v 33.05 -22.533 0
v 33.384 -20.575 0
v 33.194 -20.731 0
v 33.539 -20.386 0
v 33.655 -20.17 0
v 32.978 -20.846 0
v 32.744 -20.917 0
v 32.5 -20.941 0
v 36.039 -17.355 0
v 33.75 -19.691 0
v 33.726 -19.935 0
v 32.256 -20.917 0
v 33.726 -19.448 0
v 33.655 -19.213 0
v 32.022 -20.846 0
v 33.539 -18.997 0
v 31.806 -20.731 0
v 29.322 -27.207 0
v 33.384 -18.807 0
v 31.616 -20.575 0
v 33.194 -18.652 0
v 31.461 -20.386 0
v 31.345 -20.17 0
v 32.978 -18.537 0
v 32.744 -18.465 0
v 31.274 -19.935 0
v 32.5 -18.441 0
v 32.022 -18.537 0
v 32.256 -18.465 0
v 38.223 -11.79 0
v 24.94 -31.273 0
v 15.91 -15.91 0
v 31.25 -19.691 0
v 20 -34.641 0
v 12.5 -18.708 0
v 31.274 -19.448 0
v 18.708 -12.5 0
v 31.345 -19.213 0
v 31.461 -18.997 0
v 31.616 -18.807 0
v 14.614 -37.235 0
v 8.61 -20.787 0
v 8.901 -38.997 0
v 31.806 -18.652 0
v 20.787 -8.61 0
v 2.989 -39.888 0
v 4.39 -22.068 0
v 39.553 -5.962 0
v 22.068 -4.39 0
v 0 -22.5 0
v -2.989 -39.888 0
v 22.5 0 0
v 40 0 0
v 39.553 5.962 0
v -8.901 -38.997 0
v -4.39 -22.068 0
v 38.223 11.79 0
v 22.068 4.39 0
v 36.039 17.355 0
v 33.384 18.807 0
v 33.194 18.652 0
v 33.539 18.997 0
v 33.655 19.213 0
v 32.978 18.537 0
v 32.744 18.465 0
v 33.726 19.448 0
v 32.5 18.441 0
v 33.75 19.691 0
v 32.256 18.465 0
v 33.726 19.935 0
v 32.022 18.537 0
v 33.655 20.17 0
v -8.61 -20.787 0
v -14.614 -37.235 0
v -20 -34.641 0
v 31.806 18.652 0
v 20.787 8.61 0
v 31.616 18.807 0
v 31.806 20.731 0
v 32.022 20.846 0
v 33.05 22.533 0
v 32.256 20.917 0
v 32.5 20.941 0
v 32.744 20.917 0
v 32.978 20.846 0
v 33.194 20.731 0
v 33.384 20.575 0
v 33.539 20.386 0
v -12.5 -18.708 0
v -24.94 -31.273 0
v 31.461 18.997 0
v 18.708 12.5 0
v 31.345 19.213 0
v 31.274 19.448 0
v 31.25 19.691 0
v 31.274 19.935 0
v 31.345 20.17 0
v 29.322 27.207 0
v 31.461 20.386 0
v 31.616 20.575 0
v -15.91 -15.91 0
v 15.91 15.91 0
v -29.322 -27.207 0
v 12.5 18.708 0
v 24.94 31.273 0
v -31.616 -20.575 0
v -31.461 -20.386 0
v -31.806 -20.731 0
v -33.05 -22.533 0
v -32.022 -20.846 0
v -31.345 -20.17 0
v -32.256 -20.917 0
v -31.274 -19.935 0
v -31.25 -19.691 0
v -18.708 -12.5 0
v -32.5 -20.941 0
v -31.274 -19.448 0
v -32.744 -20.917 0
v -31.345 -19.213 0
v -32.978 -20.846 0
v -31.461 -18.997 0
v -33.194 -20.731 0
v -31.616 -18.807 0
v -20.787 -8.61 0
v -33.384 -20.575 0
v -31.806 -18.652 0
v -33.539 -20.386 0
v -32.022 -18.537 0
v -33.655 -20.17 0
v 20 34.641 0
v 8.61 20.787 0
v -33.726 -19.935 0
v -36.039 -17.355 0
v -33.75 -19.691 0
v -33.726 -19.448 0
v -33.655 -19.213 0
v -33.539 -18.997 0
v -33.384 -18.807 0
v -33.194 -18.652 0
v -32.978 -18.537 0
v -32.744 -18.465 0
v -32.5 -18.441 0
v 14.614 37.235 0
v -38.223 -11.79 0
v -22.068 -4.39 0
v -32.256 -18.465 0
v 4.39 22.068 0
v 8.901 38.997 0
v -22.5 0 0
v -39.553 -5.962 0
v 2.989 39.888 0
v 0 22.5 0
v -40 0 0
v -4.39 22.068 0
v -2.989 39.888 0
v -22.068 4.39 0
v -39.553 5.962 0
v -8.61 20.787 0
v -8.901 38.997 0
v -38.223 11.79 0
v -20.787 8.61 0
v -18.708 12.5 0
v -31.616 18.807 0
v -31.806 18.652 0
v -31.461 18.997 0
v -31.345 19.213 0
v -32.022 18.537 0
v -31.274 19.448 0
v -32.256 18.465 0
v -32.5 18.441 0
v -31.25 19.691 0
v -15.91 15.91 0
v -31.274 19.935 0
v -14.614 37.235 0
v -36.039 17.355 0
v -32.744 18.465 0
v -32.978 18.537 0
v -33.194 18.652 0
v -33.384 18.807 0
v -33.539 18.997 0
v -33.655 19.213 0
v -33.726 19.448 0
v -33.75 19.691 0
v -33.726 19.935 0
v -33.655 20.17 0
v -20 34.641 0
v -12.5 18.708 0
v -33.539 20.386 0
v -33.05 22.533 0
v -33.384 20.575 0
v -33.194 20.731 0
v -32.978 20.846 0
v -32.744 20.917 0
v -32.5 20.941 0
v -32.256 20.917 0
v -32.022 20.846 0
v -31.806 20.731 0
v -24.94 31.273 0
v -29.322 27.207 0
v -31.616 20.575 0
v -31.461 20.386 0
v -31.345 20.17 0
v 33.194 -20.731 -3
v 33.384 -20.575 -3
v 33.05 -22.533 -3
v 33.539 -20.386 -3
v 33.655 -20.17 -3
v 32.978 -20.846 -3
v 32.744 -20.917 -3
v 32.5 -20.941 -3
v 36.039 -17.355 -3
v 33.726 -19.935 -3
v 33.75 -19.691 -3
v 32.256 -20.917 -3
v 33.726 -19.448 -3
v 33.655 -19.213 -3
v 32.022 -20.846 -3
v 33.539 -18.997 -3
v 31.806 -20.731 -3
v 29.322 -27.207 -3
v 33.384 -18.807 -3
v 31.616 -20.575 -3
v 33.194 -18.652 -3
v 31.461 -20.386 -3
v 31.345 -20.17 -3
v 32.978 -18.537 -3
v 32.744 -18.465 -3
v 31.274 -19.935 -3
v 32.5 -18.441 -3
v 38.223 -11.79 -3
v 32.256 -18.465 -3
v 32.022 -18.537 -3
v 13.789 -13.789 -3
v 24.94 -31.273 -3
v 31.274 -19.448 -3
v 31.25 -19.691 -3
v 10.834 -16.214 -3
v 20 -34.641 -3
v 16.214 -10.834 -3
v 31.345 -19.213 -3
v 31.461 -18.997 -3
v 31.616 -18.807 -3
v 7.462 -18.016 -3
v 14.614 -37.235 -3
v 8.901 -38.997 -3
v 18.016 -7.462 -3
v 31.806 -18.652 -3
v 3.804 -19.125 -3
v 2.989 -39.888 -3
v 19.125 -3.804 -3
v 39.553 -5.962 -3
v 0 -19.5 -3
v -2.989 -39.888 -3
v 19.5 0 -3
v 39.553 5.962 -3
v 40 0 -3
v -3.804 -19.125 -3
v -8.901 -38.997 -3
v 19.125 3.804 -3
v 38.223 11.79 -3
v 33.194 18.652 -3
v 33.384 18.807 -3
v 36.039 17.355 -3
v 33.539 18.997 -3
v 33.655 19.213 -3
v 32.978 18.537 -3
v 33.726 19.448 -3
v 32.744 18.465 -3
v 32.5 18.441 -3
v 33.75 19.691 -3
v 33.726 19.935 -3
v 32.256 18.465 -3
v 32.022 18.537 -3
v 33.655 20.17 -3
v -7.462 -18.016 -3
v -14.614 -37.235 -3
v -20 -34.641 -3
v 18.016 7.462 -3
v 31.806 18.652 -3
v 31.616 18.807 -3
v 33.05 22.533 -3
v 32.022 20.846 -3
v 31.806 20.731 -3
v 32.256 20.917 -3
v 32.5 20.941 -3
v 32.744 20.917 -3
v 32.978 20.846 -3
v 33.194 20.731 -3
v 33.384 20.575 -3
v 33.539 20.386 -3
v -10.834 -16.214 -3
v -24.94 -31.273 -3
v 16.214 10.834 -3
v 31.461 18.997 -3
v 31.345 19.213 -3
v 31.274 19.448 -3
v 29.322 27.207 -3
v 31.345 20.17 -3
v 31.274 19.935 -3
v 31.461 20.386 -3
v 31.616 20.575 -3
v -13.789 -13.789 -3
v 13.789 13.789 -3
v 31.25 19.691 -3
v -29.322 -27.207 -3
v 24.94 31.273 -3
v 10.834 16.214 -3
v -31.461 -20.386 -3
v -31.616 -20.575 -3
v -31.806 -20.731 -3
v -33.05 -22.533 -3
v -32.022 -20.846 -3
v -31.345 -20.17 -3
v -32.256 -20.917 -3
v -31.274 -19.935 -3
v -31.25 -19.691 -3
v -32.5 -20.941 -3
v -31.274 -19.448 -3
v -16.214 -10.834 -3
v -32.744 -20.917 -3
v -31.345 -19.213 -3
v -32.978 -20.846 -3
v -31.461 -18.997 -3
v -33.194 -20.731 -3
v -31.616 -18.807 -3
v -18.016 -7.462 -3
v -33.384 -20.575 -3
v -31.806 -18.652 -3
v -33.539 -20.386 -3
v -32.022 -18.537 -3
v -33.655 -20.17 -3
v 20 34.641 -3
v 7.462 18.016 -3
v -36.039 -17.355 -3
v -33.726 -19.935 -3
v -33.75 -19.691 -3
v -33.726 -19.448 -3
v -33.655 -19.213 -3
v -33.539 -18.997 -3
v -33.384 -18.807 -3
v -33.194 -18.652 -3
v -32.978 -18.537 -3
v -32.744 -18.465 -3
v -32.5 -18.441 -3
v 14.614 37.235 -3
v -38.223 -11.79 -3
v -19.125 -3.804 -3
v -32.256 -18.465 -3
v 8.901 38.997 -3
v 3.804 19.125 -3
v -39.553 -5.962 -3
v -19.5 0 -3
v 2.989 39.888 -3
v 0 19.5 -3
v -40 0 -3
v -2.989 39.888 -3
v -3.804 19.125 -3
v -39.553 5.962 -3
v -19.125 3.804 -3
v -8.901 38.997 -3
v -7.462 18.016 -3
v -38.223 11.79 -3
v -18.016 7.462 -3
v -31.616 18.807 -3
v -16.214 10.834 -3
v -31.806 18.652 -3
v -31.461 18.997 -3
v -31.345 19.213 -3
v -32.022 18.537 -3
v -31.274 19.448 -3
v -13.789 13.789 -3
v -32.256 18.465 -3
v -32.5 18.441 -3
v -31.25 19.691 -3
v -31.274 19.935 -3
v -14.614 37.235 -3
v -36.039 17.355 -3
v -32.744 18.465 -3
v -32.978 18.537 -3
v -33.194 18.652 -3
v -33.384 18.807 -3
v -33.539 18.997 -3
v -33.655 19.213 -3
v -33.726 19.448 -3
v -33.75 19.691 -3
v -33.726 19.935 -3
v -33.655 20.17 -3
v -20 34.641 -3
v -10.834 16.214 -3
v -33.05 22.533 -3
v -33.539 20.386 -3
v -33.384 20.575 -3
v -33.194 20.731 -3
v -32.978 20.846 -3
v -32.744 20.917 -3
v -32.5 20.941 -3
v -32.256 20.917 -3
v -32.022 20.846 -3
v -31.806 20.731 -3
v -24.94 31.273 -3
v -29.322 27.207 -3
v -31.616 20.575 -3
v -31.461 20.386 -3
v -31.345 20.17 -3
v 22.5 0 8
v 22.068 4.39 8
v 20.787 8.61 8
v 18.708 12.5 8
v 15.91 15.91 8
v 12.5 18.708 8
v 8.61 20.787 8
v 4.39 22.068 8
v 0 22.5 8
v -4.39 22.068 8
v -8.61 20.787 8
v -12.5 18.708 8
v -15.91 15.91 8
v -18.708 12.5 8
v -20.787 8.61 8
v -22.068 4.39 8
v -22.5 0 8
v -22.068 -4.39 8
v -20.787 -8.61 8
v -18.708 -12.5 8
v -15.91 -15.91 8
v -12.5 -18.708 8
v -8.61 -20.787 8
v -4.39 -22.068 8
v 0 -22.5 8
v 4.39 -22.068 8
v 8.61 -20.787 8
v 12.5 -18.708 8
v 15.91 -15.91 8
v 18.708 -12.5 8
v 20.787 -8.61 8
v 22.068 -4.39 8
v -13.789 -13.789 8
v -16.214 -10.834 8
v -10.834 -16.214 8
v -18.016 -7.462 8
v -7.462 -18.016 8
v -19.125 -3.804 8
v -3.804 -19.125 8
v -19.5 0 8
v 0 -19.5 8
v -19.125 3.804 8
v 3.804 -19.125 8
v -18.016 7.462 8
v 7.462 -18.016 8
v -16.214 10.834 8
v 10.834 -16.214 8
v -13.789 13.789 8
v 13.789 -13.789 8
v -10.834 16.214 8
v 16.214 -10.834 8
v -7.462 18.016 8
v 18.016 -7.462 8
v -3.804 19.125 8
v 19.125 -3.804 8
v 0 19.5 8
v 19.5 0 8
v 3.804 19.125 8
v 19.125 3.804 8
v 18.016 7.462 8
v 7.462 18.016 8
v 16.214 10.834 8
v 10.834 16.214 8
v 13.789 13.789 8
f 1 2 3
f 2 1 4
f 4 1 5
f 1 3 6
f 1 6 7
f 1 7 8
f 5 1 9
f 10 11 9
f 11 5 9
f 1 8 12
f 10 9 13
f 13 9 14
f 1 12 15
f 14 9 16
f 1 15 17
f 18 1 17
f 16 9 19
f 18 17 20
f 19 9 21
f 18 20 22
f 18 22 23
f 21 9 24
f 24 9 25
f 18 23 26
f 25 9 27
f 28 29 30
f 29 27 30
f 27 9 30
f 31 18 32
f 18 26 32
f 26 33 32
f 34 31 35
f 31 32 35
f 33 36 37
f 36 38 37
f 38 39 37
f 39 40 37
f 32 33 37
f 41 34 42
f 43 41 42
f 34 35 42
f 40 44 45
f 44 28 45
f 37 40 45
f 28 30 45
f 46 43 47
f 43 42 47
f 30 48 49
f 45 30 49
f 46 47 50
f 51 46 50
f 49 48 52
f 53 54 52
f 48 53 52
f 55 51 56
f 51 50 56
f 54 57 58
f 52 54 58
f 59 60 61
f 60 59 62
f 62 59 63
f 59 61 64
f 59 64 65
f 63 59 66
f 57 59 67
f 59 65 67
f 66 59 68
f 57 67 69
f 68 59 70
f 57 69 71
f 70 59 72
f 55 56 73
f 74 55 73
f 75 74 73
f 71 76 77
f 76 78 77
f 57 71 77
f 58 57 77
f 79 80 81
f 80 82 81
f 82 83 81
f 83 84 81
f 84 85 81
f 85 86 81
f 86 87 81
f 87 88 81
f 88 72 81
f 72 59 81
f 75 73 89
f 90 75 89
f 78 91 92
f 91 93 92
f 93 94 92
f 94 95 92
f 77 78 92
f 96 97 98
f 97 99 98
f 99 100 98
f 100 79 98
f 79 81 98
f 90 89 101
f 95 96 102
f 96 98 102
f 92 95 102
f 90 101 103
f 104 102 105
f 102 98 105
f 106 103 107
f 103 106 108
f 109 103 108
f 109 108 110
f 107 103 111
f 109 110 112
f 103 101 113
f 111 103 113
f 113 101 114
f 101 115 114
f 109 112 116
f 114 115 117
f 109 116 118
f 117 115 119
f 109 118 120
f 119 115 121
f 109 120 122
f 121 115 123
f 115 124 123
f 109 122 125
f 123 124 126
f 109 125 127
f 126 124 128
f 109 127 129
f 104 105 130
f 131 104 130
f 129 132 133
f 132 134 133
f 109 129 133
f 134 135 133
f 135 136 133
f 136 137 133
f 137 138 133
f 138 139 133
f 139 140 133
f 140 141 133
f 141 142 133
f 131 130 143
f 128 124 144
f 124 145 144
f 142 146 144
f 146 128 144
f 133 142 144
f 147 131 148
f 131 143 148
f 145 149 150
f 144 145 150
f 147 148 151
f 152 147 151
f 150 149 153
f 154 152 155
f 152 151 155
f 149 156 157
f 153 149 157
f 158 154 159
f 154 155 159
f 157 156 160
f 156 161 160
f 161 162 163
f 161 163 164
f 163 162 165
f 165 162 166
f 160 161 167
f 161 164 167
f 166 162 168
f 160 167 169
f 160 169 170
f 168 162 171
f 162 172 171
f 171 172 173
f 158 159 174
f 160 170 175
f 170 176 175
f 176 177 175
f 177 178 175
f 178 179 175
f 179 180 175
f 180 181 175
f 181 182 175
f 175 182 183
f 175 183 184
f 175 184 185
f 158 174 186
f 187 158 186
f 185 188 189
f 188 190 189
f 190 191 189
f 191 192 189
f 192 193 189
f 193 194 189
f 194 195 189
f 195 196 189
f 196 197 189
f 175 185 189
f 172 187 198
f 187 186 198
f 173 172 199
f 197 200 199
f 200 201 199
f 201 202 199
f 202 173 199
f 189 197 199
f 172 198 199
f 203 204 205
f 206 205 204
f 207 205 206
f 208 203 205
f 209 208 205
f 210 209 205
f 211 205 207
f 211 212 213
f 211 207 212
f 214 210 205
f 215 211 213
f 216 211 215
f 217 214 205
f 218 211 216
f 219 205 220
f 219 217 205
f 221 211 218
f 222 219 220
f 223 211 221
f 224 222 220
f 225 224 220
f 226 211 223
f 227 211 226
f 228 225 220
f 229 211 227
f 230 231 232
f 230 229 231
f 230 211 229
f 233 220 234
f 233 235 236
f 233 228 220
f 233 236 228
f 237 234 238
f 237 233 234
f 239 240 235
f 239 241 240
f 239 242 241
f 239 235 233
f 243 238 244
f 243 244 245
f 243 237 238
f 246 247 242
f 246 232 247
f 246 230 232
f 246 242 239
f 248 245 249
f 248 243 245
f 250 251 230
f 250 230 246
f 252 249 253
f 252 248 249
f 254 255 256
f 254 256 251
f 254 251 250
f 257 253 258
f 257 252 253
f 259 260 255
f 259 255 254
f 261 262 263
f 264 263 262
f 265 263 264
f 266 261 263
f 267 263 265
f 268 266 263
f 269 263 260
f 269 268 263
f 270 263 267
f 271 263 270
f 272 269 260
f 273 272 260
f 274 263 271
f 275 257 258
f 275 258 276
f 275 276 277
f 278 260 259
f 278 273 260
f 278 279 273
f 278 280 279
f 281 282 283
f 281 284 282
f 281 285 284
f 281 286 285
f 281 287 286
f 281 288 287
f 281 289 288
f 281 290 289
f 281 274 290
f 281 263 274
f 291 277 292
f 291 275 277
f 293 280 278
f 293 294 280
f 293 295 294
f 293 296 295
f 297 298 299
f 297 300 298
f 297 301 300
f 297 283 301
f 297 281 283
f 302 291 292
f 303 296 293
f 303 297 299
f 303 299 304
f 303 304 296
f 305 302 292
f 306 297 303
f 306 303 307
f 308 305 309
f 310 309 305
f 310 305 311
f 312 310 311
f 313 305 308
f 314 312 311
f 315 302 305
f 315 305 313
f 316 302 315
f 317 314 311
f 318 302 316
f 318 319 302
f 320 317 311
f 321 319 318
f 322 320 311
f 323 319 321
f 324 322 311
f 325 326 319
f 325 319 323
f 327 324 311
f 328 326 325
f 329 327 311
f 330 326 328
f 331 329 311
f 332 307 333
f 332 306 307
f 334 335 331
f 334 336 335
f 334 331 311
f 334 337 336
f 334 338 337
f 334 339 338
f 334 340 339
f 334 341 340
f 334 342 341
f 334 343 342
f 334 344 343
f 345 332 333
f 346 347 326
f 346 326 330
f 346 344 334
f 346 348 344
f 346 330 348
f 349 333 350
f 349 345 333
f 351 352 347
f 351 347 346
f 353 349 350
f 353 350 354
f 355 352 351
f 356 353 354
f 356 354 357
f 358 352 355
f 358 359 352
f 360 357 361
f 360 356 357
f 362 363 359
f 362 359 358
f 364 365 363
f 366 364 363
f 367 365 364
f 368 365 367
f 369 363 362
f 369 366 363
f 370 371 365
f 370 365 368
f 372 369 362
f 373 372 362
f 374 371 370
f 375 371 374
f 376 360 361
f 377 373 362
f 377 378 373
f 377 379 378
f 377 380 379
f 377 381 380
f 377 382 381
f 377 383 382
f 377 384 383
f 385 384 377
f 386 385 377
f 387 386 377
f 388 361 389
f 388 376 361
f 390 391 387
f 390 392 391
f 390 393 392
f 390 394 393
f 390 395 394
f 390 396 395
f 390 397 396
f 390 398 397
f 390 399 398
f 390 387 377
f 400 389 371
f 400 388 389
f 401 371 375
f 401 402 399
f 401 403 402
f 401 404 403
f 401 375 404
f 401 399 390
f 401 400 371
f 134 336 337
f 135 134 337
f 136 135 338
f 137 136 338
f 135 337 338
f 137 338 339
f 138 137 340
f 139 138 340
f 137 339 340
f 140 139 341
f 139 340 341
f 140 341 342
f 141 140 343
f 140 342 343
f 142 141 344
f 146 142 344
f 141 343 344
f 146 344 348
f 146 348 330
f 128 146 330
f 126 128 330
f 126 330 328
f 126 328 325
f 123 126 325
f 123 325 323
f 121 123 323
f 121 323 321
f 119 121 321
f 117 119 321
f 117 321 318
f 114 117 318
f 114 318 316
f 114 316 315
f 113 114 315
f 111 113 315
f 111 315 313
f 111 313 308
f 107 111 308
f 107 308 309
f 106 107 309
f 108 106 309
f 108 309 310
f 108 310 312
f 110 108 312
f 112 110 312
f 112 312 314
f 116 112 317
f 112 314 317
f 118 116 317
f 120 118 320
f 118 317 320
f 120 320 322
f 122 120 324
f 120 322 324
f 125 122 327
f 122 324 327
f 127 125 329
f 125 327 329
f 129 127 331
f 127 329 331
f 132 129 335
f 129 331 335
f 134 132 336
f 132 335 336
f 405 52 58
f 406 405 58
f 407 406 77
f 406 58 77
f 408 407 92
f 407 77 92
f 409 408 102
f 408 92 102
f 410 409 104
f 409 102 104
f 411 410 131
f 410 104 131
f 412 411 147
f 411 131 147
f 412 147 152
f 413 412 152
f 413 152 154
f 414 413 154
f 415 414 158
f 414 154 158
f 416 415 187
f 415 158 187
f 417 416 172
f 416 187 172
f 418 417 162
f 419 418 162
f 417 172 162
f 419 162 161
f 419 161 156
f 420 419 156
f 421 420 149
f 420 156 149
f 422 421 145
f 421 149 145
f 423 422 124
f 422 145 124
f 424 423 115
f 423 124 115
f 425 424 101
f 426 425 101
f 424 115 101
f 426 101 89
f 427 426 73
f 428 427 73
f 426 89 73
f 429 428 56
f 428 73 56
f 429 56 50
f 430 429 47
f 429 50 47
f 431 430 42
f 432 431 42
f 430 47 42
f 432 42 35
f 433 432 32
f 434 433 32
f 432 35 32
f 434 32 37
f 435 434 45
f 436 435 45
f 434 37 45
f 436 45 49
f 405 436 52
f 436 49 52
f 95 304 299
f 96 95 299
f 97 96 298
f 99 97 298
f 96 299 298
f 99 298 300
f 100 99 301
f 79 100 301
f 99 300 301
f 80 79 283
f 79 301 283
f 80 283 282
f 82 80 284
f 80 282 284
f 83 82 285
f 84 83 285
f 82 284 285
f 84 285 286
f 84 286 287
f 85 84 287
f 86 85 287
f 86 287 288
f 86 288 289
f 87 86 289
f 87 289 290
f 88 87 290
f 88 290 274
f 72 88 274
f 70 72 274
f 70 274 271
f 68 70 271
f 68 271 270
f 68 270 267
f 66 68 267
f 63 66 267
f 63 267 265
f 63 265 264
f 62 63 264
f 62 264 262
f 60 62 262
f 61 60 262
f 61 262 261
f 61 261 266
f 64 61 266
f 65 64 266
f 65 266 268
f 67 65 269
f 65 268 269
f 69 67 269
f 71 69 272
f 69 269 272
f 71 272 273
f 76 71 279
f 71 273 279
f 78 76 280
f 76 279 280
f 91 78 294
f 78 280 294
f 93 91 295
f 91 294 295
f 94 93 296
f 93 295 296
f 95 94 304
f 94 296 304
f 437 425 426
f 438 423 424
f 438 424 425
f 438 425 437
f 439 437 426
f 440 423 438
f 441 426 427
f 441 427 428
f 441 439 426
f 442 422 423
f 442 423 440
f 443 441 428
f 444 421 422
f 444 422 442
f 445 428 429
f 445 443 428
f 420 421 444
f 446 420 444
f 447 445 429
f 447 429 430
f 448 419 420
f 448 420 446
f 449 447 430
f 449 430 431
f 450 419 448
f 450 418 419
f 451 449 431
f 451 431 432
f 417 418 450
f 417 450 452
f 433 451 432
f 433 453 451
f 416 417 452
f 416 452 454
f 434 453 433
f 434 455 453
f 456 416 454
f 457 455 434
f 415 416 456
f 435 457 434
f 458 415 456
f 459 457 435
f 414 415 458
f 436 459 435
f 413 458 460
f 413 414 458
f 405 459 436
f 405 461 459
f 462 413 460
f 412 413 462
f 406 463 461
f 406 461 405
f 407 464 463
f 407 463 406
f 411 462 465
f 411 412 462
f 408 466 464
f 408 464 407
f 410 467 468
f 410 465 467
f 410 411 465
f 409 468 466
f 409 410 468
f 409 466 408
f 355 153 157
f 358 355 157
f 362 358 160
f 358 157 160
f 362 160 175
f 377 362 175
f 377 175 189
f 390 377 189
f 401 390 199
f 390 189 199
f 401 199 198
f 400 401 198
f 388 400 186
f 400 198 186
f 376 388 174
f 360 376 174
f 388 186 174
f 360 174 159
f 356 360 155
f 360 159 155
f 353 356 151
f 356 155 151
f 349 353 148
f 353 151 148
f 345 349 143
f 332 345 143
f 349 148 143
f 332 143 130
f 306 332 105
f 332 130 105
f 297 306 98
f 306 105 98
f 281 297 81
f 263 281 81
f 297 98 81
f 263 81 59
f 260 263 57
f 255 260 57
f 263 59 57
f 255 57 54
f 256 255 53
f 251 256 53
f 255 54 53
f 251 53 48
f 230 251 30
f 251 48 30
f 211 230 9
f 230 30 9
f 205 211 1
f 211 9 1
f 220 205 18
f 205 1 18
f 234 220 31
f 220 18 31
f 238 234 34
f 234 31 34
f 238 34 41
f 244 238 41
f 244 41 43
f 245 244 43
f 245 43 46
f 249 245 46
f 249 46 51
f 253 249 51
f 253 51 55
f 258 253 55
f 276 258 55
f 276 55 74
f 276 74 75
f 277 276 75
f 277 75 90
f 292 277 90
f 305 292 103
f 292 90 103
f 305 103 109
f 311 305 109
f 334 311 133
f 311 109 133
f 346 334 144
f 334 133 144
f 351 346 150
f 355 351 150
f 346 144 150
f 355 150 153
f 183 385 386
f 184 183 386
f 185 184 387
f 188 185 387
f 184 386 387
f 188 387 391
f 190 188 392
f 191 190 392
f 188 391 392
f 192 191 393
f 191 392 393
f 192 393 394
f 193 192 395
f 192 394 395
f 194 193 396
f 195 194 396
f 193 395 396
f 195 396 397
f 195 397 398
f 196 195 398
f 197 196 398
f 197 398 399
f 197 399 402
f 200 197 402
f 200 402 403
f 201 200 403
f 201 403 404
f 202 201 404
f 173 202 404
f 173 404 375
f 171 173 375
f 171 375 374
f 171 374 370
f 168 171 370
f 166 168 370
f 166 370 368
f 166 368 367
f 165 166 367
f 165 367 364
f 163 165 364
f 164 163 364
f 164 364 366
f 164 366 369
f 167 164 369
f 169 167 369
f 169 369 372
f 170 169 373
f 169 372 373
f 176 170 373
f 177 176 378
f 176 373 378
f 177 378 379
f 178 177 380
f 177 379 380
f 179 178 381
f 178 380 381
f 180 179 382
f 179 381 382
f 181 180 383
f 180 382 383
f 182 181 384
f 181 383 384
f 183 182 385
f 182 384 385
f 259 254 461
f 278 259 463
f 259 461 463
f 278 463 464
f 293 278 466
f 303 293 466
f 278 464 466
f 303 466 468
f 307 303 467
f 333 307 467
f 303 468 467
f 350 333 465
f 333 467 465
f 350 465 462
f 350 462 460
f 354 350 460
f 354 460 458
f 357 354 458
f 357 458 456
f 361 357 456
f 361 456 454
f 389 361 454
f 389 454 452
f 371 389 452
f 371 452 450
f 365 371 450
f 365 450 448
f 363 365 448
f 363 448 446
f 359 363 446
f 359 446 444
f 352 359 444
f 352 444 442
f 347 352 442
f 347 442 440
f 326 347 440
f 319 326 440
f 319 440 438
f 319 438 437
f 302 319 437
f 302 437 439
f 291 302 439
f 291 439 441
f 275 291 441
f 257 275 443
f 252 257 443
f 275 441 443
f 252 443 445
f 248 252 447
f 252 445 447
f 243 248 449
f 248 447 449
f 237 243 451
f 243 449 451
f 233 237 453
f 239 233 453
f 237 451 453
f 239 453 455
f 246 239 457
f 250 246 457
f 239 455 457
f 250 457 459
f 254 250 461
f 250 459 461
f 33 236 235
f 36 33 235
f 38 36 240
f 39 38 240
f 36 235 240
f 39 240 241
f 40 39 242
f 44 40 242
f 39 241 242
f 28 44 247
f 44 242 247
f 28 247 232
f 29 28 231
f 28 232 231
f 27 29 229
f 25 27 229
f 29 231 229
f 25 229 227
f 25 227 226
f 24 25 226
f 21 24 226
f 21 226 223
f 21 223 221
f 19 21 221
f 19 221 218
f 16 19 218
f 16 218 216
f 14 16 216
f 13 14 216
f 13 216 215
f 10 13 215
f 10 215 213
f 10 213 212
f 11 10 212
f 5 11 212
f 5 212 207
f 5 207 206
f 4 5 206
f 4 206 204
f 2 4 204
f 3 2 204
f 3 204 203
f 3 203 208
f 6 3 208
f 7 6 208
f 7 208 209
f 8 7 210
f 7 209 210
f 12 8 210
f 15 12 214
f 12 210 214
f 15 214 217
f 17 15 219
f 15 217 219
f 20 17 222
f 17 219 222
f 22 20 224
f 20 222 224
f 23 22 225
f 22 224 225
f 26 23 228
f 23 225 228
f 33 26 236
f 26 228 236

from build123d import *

# Parameters (mm, degrees)
SKETCH_1_R          = 22.5
EXTRUDE_1_DEPTH     = 8
SKETCH_2_R          = 40
EXTRUDE_2_DEPTH     = 3
SKETCH_4_R          = 19.5
CUT_EXTRUDE_2_DEPTH = 58.628118137
SKETCH_7_R          = 1.25
CUT_EXTRUDE_4_DEPTH = 58.628118137


with BuildPart() as part:
    # 草图1 → 凸台-拉伸1 (new body)
    with BuildSketch(Plane.XY):
        Circle(SKETCH_1_R)
    extrude(amount=EXTRUDE_1_DEPTH)

    # 草图2 → 凸台-拉伸2 (add)
    with BuildSketch(Plane(origin=(0, 0, 0), x_dir=(-1, 0, 0), z_dir=(0, 0, -1))):
        Circle(SKETCH_2_R)
    extrude(amount=EXTRUDE_2_DEPTH)

    # 草图4 → 切除-拉伸2 (cut, through all)
    with BuildSketch(Plane.XY.offset(8)):
        Circle(SKETCH_4_R)
    extrude(amount=-CUT_EXTRUDE_2_DEPTH, mode=Mode.SUBTRACT)

    # 草图7 → 切除-拉伸4 (cut, through all)
    with BuildSketch(Plane(origin=(0, 0, -3), x_dir=(-1, 0, 0), z_dir=(0, 0, -1))):
        with Locations((32.5, 19.691368668)):
            Circle(SKETCH_7_R)
        with Locations((-32.5, 19.691368668)):
            Circle(SKETCH_7_R)
        with Locations((32.5, -19.691368668)):
            Circle(SKETCH_7_R)
        with Locations((-32.5, -19.691368668)):
            Circle(SKETCH_7_R)
    extrude(amount=-CUT_EXTRUDE_4_DEPTH, mode=Mode.SUBTRACT)


solid = part.part
